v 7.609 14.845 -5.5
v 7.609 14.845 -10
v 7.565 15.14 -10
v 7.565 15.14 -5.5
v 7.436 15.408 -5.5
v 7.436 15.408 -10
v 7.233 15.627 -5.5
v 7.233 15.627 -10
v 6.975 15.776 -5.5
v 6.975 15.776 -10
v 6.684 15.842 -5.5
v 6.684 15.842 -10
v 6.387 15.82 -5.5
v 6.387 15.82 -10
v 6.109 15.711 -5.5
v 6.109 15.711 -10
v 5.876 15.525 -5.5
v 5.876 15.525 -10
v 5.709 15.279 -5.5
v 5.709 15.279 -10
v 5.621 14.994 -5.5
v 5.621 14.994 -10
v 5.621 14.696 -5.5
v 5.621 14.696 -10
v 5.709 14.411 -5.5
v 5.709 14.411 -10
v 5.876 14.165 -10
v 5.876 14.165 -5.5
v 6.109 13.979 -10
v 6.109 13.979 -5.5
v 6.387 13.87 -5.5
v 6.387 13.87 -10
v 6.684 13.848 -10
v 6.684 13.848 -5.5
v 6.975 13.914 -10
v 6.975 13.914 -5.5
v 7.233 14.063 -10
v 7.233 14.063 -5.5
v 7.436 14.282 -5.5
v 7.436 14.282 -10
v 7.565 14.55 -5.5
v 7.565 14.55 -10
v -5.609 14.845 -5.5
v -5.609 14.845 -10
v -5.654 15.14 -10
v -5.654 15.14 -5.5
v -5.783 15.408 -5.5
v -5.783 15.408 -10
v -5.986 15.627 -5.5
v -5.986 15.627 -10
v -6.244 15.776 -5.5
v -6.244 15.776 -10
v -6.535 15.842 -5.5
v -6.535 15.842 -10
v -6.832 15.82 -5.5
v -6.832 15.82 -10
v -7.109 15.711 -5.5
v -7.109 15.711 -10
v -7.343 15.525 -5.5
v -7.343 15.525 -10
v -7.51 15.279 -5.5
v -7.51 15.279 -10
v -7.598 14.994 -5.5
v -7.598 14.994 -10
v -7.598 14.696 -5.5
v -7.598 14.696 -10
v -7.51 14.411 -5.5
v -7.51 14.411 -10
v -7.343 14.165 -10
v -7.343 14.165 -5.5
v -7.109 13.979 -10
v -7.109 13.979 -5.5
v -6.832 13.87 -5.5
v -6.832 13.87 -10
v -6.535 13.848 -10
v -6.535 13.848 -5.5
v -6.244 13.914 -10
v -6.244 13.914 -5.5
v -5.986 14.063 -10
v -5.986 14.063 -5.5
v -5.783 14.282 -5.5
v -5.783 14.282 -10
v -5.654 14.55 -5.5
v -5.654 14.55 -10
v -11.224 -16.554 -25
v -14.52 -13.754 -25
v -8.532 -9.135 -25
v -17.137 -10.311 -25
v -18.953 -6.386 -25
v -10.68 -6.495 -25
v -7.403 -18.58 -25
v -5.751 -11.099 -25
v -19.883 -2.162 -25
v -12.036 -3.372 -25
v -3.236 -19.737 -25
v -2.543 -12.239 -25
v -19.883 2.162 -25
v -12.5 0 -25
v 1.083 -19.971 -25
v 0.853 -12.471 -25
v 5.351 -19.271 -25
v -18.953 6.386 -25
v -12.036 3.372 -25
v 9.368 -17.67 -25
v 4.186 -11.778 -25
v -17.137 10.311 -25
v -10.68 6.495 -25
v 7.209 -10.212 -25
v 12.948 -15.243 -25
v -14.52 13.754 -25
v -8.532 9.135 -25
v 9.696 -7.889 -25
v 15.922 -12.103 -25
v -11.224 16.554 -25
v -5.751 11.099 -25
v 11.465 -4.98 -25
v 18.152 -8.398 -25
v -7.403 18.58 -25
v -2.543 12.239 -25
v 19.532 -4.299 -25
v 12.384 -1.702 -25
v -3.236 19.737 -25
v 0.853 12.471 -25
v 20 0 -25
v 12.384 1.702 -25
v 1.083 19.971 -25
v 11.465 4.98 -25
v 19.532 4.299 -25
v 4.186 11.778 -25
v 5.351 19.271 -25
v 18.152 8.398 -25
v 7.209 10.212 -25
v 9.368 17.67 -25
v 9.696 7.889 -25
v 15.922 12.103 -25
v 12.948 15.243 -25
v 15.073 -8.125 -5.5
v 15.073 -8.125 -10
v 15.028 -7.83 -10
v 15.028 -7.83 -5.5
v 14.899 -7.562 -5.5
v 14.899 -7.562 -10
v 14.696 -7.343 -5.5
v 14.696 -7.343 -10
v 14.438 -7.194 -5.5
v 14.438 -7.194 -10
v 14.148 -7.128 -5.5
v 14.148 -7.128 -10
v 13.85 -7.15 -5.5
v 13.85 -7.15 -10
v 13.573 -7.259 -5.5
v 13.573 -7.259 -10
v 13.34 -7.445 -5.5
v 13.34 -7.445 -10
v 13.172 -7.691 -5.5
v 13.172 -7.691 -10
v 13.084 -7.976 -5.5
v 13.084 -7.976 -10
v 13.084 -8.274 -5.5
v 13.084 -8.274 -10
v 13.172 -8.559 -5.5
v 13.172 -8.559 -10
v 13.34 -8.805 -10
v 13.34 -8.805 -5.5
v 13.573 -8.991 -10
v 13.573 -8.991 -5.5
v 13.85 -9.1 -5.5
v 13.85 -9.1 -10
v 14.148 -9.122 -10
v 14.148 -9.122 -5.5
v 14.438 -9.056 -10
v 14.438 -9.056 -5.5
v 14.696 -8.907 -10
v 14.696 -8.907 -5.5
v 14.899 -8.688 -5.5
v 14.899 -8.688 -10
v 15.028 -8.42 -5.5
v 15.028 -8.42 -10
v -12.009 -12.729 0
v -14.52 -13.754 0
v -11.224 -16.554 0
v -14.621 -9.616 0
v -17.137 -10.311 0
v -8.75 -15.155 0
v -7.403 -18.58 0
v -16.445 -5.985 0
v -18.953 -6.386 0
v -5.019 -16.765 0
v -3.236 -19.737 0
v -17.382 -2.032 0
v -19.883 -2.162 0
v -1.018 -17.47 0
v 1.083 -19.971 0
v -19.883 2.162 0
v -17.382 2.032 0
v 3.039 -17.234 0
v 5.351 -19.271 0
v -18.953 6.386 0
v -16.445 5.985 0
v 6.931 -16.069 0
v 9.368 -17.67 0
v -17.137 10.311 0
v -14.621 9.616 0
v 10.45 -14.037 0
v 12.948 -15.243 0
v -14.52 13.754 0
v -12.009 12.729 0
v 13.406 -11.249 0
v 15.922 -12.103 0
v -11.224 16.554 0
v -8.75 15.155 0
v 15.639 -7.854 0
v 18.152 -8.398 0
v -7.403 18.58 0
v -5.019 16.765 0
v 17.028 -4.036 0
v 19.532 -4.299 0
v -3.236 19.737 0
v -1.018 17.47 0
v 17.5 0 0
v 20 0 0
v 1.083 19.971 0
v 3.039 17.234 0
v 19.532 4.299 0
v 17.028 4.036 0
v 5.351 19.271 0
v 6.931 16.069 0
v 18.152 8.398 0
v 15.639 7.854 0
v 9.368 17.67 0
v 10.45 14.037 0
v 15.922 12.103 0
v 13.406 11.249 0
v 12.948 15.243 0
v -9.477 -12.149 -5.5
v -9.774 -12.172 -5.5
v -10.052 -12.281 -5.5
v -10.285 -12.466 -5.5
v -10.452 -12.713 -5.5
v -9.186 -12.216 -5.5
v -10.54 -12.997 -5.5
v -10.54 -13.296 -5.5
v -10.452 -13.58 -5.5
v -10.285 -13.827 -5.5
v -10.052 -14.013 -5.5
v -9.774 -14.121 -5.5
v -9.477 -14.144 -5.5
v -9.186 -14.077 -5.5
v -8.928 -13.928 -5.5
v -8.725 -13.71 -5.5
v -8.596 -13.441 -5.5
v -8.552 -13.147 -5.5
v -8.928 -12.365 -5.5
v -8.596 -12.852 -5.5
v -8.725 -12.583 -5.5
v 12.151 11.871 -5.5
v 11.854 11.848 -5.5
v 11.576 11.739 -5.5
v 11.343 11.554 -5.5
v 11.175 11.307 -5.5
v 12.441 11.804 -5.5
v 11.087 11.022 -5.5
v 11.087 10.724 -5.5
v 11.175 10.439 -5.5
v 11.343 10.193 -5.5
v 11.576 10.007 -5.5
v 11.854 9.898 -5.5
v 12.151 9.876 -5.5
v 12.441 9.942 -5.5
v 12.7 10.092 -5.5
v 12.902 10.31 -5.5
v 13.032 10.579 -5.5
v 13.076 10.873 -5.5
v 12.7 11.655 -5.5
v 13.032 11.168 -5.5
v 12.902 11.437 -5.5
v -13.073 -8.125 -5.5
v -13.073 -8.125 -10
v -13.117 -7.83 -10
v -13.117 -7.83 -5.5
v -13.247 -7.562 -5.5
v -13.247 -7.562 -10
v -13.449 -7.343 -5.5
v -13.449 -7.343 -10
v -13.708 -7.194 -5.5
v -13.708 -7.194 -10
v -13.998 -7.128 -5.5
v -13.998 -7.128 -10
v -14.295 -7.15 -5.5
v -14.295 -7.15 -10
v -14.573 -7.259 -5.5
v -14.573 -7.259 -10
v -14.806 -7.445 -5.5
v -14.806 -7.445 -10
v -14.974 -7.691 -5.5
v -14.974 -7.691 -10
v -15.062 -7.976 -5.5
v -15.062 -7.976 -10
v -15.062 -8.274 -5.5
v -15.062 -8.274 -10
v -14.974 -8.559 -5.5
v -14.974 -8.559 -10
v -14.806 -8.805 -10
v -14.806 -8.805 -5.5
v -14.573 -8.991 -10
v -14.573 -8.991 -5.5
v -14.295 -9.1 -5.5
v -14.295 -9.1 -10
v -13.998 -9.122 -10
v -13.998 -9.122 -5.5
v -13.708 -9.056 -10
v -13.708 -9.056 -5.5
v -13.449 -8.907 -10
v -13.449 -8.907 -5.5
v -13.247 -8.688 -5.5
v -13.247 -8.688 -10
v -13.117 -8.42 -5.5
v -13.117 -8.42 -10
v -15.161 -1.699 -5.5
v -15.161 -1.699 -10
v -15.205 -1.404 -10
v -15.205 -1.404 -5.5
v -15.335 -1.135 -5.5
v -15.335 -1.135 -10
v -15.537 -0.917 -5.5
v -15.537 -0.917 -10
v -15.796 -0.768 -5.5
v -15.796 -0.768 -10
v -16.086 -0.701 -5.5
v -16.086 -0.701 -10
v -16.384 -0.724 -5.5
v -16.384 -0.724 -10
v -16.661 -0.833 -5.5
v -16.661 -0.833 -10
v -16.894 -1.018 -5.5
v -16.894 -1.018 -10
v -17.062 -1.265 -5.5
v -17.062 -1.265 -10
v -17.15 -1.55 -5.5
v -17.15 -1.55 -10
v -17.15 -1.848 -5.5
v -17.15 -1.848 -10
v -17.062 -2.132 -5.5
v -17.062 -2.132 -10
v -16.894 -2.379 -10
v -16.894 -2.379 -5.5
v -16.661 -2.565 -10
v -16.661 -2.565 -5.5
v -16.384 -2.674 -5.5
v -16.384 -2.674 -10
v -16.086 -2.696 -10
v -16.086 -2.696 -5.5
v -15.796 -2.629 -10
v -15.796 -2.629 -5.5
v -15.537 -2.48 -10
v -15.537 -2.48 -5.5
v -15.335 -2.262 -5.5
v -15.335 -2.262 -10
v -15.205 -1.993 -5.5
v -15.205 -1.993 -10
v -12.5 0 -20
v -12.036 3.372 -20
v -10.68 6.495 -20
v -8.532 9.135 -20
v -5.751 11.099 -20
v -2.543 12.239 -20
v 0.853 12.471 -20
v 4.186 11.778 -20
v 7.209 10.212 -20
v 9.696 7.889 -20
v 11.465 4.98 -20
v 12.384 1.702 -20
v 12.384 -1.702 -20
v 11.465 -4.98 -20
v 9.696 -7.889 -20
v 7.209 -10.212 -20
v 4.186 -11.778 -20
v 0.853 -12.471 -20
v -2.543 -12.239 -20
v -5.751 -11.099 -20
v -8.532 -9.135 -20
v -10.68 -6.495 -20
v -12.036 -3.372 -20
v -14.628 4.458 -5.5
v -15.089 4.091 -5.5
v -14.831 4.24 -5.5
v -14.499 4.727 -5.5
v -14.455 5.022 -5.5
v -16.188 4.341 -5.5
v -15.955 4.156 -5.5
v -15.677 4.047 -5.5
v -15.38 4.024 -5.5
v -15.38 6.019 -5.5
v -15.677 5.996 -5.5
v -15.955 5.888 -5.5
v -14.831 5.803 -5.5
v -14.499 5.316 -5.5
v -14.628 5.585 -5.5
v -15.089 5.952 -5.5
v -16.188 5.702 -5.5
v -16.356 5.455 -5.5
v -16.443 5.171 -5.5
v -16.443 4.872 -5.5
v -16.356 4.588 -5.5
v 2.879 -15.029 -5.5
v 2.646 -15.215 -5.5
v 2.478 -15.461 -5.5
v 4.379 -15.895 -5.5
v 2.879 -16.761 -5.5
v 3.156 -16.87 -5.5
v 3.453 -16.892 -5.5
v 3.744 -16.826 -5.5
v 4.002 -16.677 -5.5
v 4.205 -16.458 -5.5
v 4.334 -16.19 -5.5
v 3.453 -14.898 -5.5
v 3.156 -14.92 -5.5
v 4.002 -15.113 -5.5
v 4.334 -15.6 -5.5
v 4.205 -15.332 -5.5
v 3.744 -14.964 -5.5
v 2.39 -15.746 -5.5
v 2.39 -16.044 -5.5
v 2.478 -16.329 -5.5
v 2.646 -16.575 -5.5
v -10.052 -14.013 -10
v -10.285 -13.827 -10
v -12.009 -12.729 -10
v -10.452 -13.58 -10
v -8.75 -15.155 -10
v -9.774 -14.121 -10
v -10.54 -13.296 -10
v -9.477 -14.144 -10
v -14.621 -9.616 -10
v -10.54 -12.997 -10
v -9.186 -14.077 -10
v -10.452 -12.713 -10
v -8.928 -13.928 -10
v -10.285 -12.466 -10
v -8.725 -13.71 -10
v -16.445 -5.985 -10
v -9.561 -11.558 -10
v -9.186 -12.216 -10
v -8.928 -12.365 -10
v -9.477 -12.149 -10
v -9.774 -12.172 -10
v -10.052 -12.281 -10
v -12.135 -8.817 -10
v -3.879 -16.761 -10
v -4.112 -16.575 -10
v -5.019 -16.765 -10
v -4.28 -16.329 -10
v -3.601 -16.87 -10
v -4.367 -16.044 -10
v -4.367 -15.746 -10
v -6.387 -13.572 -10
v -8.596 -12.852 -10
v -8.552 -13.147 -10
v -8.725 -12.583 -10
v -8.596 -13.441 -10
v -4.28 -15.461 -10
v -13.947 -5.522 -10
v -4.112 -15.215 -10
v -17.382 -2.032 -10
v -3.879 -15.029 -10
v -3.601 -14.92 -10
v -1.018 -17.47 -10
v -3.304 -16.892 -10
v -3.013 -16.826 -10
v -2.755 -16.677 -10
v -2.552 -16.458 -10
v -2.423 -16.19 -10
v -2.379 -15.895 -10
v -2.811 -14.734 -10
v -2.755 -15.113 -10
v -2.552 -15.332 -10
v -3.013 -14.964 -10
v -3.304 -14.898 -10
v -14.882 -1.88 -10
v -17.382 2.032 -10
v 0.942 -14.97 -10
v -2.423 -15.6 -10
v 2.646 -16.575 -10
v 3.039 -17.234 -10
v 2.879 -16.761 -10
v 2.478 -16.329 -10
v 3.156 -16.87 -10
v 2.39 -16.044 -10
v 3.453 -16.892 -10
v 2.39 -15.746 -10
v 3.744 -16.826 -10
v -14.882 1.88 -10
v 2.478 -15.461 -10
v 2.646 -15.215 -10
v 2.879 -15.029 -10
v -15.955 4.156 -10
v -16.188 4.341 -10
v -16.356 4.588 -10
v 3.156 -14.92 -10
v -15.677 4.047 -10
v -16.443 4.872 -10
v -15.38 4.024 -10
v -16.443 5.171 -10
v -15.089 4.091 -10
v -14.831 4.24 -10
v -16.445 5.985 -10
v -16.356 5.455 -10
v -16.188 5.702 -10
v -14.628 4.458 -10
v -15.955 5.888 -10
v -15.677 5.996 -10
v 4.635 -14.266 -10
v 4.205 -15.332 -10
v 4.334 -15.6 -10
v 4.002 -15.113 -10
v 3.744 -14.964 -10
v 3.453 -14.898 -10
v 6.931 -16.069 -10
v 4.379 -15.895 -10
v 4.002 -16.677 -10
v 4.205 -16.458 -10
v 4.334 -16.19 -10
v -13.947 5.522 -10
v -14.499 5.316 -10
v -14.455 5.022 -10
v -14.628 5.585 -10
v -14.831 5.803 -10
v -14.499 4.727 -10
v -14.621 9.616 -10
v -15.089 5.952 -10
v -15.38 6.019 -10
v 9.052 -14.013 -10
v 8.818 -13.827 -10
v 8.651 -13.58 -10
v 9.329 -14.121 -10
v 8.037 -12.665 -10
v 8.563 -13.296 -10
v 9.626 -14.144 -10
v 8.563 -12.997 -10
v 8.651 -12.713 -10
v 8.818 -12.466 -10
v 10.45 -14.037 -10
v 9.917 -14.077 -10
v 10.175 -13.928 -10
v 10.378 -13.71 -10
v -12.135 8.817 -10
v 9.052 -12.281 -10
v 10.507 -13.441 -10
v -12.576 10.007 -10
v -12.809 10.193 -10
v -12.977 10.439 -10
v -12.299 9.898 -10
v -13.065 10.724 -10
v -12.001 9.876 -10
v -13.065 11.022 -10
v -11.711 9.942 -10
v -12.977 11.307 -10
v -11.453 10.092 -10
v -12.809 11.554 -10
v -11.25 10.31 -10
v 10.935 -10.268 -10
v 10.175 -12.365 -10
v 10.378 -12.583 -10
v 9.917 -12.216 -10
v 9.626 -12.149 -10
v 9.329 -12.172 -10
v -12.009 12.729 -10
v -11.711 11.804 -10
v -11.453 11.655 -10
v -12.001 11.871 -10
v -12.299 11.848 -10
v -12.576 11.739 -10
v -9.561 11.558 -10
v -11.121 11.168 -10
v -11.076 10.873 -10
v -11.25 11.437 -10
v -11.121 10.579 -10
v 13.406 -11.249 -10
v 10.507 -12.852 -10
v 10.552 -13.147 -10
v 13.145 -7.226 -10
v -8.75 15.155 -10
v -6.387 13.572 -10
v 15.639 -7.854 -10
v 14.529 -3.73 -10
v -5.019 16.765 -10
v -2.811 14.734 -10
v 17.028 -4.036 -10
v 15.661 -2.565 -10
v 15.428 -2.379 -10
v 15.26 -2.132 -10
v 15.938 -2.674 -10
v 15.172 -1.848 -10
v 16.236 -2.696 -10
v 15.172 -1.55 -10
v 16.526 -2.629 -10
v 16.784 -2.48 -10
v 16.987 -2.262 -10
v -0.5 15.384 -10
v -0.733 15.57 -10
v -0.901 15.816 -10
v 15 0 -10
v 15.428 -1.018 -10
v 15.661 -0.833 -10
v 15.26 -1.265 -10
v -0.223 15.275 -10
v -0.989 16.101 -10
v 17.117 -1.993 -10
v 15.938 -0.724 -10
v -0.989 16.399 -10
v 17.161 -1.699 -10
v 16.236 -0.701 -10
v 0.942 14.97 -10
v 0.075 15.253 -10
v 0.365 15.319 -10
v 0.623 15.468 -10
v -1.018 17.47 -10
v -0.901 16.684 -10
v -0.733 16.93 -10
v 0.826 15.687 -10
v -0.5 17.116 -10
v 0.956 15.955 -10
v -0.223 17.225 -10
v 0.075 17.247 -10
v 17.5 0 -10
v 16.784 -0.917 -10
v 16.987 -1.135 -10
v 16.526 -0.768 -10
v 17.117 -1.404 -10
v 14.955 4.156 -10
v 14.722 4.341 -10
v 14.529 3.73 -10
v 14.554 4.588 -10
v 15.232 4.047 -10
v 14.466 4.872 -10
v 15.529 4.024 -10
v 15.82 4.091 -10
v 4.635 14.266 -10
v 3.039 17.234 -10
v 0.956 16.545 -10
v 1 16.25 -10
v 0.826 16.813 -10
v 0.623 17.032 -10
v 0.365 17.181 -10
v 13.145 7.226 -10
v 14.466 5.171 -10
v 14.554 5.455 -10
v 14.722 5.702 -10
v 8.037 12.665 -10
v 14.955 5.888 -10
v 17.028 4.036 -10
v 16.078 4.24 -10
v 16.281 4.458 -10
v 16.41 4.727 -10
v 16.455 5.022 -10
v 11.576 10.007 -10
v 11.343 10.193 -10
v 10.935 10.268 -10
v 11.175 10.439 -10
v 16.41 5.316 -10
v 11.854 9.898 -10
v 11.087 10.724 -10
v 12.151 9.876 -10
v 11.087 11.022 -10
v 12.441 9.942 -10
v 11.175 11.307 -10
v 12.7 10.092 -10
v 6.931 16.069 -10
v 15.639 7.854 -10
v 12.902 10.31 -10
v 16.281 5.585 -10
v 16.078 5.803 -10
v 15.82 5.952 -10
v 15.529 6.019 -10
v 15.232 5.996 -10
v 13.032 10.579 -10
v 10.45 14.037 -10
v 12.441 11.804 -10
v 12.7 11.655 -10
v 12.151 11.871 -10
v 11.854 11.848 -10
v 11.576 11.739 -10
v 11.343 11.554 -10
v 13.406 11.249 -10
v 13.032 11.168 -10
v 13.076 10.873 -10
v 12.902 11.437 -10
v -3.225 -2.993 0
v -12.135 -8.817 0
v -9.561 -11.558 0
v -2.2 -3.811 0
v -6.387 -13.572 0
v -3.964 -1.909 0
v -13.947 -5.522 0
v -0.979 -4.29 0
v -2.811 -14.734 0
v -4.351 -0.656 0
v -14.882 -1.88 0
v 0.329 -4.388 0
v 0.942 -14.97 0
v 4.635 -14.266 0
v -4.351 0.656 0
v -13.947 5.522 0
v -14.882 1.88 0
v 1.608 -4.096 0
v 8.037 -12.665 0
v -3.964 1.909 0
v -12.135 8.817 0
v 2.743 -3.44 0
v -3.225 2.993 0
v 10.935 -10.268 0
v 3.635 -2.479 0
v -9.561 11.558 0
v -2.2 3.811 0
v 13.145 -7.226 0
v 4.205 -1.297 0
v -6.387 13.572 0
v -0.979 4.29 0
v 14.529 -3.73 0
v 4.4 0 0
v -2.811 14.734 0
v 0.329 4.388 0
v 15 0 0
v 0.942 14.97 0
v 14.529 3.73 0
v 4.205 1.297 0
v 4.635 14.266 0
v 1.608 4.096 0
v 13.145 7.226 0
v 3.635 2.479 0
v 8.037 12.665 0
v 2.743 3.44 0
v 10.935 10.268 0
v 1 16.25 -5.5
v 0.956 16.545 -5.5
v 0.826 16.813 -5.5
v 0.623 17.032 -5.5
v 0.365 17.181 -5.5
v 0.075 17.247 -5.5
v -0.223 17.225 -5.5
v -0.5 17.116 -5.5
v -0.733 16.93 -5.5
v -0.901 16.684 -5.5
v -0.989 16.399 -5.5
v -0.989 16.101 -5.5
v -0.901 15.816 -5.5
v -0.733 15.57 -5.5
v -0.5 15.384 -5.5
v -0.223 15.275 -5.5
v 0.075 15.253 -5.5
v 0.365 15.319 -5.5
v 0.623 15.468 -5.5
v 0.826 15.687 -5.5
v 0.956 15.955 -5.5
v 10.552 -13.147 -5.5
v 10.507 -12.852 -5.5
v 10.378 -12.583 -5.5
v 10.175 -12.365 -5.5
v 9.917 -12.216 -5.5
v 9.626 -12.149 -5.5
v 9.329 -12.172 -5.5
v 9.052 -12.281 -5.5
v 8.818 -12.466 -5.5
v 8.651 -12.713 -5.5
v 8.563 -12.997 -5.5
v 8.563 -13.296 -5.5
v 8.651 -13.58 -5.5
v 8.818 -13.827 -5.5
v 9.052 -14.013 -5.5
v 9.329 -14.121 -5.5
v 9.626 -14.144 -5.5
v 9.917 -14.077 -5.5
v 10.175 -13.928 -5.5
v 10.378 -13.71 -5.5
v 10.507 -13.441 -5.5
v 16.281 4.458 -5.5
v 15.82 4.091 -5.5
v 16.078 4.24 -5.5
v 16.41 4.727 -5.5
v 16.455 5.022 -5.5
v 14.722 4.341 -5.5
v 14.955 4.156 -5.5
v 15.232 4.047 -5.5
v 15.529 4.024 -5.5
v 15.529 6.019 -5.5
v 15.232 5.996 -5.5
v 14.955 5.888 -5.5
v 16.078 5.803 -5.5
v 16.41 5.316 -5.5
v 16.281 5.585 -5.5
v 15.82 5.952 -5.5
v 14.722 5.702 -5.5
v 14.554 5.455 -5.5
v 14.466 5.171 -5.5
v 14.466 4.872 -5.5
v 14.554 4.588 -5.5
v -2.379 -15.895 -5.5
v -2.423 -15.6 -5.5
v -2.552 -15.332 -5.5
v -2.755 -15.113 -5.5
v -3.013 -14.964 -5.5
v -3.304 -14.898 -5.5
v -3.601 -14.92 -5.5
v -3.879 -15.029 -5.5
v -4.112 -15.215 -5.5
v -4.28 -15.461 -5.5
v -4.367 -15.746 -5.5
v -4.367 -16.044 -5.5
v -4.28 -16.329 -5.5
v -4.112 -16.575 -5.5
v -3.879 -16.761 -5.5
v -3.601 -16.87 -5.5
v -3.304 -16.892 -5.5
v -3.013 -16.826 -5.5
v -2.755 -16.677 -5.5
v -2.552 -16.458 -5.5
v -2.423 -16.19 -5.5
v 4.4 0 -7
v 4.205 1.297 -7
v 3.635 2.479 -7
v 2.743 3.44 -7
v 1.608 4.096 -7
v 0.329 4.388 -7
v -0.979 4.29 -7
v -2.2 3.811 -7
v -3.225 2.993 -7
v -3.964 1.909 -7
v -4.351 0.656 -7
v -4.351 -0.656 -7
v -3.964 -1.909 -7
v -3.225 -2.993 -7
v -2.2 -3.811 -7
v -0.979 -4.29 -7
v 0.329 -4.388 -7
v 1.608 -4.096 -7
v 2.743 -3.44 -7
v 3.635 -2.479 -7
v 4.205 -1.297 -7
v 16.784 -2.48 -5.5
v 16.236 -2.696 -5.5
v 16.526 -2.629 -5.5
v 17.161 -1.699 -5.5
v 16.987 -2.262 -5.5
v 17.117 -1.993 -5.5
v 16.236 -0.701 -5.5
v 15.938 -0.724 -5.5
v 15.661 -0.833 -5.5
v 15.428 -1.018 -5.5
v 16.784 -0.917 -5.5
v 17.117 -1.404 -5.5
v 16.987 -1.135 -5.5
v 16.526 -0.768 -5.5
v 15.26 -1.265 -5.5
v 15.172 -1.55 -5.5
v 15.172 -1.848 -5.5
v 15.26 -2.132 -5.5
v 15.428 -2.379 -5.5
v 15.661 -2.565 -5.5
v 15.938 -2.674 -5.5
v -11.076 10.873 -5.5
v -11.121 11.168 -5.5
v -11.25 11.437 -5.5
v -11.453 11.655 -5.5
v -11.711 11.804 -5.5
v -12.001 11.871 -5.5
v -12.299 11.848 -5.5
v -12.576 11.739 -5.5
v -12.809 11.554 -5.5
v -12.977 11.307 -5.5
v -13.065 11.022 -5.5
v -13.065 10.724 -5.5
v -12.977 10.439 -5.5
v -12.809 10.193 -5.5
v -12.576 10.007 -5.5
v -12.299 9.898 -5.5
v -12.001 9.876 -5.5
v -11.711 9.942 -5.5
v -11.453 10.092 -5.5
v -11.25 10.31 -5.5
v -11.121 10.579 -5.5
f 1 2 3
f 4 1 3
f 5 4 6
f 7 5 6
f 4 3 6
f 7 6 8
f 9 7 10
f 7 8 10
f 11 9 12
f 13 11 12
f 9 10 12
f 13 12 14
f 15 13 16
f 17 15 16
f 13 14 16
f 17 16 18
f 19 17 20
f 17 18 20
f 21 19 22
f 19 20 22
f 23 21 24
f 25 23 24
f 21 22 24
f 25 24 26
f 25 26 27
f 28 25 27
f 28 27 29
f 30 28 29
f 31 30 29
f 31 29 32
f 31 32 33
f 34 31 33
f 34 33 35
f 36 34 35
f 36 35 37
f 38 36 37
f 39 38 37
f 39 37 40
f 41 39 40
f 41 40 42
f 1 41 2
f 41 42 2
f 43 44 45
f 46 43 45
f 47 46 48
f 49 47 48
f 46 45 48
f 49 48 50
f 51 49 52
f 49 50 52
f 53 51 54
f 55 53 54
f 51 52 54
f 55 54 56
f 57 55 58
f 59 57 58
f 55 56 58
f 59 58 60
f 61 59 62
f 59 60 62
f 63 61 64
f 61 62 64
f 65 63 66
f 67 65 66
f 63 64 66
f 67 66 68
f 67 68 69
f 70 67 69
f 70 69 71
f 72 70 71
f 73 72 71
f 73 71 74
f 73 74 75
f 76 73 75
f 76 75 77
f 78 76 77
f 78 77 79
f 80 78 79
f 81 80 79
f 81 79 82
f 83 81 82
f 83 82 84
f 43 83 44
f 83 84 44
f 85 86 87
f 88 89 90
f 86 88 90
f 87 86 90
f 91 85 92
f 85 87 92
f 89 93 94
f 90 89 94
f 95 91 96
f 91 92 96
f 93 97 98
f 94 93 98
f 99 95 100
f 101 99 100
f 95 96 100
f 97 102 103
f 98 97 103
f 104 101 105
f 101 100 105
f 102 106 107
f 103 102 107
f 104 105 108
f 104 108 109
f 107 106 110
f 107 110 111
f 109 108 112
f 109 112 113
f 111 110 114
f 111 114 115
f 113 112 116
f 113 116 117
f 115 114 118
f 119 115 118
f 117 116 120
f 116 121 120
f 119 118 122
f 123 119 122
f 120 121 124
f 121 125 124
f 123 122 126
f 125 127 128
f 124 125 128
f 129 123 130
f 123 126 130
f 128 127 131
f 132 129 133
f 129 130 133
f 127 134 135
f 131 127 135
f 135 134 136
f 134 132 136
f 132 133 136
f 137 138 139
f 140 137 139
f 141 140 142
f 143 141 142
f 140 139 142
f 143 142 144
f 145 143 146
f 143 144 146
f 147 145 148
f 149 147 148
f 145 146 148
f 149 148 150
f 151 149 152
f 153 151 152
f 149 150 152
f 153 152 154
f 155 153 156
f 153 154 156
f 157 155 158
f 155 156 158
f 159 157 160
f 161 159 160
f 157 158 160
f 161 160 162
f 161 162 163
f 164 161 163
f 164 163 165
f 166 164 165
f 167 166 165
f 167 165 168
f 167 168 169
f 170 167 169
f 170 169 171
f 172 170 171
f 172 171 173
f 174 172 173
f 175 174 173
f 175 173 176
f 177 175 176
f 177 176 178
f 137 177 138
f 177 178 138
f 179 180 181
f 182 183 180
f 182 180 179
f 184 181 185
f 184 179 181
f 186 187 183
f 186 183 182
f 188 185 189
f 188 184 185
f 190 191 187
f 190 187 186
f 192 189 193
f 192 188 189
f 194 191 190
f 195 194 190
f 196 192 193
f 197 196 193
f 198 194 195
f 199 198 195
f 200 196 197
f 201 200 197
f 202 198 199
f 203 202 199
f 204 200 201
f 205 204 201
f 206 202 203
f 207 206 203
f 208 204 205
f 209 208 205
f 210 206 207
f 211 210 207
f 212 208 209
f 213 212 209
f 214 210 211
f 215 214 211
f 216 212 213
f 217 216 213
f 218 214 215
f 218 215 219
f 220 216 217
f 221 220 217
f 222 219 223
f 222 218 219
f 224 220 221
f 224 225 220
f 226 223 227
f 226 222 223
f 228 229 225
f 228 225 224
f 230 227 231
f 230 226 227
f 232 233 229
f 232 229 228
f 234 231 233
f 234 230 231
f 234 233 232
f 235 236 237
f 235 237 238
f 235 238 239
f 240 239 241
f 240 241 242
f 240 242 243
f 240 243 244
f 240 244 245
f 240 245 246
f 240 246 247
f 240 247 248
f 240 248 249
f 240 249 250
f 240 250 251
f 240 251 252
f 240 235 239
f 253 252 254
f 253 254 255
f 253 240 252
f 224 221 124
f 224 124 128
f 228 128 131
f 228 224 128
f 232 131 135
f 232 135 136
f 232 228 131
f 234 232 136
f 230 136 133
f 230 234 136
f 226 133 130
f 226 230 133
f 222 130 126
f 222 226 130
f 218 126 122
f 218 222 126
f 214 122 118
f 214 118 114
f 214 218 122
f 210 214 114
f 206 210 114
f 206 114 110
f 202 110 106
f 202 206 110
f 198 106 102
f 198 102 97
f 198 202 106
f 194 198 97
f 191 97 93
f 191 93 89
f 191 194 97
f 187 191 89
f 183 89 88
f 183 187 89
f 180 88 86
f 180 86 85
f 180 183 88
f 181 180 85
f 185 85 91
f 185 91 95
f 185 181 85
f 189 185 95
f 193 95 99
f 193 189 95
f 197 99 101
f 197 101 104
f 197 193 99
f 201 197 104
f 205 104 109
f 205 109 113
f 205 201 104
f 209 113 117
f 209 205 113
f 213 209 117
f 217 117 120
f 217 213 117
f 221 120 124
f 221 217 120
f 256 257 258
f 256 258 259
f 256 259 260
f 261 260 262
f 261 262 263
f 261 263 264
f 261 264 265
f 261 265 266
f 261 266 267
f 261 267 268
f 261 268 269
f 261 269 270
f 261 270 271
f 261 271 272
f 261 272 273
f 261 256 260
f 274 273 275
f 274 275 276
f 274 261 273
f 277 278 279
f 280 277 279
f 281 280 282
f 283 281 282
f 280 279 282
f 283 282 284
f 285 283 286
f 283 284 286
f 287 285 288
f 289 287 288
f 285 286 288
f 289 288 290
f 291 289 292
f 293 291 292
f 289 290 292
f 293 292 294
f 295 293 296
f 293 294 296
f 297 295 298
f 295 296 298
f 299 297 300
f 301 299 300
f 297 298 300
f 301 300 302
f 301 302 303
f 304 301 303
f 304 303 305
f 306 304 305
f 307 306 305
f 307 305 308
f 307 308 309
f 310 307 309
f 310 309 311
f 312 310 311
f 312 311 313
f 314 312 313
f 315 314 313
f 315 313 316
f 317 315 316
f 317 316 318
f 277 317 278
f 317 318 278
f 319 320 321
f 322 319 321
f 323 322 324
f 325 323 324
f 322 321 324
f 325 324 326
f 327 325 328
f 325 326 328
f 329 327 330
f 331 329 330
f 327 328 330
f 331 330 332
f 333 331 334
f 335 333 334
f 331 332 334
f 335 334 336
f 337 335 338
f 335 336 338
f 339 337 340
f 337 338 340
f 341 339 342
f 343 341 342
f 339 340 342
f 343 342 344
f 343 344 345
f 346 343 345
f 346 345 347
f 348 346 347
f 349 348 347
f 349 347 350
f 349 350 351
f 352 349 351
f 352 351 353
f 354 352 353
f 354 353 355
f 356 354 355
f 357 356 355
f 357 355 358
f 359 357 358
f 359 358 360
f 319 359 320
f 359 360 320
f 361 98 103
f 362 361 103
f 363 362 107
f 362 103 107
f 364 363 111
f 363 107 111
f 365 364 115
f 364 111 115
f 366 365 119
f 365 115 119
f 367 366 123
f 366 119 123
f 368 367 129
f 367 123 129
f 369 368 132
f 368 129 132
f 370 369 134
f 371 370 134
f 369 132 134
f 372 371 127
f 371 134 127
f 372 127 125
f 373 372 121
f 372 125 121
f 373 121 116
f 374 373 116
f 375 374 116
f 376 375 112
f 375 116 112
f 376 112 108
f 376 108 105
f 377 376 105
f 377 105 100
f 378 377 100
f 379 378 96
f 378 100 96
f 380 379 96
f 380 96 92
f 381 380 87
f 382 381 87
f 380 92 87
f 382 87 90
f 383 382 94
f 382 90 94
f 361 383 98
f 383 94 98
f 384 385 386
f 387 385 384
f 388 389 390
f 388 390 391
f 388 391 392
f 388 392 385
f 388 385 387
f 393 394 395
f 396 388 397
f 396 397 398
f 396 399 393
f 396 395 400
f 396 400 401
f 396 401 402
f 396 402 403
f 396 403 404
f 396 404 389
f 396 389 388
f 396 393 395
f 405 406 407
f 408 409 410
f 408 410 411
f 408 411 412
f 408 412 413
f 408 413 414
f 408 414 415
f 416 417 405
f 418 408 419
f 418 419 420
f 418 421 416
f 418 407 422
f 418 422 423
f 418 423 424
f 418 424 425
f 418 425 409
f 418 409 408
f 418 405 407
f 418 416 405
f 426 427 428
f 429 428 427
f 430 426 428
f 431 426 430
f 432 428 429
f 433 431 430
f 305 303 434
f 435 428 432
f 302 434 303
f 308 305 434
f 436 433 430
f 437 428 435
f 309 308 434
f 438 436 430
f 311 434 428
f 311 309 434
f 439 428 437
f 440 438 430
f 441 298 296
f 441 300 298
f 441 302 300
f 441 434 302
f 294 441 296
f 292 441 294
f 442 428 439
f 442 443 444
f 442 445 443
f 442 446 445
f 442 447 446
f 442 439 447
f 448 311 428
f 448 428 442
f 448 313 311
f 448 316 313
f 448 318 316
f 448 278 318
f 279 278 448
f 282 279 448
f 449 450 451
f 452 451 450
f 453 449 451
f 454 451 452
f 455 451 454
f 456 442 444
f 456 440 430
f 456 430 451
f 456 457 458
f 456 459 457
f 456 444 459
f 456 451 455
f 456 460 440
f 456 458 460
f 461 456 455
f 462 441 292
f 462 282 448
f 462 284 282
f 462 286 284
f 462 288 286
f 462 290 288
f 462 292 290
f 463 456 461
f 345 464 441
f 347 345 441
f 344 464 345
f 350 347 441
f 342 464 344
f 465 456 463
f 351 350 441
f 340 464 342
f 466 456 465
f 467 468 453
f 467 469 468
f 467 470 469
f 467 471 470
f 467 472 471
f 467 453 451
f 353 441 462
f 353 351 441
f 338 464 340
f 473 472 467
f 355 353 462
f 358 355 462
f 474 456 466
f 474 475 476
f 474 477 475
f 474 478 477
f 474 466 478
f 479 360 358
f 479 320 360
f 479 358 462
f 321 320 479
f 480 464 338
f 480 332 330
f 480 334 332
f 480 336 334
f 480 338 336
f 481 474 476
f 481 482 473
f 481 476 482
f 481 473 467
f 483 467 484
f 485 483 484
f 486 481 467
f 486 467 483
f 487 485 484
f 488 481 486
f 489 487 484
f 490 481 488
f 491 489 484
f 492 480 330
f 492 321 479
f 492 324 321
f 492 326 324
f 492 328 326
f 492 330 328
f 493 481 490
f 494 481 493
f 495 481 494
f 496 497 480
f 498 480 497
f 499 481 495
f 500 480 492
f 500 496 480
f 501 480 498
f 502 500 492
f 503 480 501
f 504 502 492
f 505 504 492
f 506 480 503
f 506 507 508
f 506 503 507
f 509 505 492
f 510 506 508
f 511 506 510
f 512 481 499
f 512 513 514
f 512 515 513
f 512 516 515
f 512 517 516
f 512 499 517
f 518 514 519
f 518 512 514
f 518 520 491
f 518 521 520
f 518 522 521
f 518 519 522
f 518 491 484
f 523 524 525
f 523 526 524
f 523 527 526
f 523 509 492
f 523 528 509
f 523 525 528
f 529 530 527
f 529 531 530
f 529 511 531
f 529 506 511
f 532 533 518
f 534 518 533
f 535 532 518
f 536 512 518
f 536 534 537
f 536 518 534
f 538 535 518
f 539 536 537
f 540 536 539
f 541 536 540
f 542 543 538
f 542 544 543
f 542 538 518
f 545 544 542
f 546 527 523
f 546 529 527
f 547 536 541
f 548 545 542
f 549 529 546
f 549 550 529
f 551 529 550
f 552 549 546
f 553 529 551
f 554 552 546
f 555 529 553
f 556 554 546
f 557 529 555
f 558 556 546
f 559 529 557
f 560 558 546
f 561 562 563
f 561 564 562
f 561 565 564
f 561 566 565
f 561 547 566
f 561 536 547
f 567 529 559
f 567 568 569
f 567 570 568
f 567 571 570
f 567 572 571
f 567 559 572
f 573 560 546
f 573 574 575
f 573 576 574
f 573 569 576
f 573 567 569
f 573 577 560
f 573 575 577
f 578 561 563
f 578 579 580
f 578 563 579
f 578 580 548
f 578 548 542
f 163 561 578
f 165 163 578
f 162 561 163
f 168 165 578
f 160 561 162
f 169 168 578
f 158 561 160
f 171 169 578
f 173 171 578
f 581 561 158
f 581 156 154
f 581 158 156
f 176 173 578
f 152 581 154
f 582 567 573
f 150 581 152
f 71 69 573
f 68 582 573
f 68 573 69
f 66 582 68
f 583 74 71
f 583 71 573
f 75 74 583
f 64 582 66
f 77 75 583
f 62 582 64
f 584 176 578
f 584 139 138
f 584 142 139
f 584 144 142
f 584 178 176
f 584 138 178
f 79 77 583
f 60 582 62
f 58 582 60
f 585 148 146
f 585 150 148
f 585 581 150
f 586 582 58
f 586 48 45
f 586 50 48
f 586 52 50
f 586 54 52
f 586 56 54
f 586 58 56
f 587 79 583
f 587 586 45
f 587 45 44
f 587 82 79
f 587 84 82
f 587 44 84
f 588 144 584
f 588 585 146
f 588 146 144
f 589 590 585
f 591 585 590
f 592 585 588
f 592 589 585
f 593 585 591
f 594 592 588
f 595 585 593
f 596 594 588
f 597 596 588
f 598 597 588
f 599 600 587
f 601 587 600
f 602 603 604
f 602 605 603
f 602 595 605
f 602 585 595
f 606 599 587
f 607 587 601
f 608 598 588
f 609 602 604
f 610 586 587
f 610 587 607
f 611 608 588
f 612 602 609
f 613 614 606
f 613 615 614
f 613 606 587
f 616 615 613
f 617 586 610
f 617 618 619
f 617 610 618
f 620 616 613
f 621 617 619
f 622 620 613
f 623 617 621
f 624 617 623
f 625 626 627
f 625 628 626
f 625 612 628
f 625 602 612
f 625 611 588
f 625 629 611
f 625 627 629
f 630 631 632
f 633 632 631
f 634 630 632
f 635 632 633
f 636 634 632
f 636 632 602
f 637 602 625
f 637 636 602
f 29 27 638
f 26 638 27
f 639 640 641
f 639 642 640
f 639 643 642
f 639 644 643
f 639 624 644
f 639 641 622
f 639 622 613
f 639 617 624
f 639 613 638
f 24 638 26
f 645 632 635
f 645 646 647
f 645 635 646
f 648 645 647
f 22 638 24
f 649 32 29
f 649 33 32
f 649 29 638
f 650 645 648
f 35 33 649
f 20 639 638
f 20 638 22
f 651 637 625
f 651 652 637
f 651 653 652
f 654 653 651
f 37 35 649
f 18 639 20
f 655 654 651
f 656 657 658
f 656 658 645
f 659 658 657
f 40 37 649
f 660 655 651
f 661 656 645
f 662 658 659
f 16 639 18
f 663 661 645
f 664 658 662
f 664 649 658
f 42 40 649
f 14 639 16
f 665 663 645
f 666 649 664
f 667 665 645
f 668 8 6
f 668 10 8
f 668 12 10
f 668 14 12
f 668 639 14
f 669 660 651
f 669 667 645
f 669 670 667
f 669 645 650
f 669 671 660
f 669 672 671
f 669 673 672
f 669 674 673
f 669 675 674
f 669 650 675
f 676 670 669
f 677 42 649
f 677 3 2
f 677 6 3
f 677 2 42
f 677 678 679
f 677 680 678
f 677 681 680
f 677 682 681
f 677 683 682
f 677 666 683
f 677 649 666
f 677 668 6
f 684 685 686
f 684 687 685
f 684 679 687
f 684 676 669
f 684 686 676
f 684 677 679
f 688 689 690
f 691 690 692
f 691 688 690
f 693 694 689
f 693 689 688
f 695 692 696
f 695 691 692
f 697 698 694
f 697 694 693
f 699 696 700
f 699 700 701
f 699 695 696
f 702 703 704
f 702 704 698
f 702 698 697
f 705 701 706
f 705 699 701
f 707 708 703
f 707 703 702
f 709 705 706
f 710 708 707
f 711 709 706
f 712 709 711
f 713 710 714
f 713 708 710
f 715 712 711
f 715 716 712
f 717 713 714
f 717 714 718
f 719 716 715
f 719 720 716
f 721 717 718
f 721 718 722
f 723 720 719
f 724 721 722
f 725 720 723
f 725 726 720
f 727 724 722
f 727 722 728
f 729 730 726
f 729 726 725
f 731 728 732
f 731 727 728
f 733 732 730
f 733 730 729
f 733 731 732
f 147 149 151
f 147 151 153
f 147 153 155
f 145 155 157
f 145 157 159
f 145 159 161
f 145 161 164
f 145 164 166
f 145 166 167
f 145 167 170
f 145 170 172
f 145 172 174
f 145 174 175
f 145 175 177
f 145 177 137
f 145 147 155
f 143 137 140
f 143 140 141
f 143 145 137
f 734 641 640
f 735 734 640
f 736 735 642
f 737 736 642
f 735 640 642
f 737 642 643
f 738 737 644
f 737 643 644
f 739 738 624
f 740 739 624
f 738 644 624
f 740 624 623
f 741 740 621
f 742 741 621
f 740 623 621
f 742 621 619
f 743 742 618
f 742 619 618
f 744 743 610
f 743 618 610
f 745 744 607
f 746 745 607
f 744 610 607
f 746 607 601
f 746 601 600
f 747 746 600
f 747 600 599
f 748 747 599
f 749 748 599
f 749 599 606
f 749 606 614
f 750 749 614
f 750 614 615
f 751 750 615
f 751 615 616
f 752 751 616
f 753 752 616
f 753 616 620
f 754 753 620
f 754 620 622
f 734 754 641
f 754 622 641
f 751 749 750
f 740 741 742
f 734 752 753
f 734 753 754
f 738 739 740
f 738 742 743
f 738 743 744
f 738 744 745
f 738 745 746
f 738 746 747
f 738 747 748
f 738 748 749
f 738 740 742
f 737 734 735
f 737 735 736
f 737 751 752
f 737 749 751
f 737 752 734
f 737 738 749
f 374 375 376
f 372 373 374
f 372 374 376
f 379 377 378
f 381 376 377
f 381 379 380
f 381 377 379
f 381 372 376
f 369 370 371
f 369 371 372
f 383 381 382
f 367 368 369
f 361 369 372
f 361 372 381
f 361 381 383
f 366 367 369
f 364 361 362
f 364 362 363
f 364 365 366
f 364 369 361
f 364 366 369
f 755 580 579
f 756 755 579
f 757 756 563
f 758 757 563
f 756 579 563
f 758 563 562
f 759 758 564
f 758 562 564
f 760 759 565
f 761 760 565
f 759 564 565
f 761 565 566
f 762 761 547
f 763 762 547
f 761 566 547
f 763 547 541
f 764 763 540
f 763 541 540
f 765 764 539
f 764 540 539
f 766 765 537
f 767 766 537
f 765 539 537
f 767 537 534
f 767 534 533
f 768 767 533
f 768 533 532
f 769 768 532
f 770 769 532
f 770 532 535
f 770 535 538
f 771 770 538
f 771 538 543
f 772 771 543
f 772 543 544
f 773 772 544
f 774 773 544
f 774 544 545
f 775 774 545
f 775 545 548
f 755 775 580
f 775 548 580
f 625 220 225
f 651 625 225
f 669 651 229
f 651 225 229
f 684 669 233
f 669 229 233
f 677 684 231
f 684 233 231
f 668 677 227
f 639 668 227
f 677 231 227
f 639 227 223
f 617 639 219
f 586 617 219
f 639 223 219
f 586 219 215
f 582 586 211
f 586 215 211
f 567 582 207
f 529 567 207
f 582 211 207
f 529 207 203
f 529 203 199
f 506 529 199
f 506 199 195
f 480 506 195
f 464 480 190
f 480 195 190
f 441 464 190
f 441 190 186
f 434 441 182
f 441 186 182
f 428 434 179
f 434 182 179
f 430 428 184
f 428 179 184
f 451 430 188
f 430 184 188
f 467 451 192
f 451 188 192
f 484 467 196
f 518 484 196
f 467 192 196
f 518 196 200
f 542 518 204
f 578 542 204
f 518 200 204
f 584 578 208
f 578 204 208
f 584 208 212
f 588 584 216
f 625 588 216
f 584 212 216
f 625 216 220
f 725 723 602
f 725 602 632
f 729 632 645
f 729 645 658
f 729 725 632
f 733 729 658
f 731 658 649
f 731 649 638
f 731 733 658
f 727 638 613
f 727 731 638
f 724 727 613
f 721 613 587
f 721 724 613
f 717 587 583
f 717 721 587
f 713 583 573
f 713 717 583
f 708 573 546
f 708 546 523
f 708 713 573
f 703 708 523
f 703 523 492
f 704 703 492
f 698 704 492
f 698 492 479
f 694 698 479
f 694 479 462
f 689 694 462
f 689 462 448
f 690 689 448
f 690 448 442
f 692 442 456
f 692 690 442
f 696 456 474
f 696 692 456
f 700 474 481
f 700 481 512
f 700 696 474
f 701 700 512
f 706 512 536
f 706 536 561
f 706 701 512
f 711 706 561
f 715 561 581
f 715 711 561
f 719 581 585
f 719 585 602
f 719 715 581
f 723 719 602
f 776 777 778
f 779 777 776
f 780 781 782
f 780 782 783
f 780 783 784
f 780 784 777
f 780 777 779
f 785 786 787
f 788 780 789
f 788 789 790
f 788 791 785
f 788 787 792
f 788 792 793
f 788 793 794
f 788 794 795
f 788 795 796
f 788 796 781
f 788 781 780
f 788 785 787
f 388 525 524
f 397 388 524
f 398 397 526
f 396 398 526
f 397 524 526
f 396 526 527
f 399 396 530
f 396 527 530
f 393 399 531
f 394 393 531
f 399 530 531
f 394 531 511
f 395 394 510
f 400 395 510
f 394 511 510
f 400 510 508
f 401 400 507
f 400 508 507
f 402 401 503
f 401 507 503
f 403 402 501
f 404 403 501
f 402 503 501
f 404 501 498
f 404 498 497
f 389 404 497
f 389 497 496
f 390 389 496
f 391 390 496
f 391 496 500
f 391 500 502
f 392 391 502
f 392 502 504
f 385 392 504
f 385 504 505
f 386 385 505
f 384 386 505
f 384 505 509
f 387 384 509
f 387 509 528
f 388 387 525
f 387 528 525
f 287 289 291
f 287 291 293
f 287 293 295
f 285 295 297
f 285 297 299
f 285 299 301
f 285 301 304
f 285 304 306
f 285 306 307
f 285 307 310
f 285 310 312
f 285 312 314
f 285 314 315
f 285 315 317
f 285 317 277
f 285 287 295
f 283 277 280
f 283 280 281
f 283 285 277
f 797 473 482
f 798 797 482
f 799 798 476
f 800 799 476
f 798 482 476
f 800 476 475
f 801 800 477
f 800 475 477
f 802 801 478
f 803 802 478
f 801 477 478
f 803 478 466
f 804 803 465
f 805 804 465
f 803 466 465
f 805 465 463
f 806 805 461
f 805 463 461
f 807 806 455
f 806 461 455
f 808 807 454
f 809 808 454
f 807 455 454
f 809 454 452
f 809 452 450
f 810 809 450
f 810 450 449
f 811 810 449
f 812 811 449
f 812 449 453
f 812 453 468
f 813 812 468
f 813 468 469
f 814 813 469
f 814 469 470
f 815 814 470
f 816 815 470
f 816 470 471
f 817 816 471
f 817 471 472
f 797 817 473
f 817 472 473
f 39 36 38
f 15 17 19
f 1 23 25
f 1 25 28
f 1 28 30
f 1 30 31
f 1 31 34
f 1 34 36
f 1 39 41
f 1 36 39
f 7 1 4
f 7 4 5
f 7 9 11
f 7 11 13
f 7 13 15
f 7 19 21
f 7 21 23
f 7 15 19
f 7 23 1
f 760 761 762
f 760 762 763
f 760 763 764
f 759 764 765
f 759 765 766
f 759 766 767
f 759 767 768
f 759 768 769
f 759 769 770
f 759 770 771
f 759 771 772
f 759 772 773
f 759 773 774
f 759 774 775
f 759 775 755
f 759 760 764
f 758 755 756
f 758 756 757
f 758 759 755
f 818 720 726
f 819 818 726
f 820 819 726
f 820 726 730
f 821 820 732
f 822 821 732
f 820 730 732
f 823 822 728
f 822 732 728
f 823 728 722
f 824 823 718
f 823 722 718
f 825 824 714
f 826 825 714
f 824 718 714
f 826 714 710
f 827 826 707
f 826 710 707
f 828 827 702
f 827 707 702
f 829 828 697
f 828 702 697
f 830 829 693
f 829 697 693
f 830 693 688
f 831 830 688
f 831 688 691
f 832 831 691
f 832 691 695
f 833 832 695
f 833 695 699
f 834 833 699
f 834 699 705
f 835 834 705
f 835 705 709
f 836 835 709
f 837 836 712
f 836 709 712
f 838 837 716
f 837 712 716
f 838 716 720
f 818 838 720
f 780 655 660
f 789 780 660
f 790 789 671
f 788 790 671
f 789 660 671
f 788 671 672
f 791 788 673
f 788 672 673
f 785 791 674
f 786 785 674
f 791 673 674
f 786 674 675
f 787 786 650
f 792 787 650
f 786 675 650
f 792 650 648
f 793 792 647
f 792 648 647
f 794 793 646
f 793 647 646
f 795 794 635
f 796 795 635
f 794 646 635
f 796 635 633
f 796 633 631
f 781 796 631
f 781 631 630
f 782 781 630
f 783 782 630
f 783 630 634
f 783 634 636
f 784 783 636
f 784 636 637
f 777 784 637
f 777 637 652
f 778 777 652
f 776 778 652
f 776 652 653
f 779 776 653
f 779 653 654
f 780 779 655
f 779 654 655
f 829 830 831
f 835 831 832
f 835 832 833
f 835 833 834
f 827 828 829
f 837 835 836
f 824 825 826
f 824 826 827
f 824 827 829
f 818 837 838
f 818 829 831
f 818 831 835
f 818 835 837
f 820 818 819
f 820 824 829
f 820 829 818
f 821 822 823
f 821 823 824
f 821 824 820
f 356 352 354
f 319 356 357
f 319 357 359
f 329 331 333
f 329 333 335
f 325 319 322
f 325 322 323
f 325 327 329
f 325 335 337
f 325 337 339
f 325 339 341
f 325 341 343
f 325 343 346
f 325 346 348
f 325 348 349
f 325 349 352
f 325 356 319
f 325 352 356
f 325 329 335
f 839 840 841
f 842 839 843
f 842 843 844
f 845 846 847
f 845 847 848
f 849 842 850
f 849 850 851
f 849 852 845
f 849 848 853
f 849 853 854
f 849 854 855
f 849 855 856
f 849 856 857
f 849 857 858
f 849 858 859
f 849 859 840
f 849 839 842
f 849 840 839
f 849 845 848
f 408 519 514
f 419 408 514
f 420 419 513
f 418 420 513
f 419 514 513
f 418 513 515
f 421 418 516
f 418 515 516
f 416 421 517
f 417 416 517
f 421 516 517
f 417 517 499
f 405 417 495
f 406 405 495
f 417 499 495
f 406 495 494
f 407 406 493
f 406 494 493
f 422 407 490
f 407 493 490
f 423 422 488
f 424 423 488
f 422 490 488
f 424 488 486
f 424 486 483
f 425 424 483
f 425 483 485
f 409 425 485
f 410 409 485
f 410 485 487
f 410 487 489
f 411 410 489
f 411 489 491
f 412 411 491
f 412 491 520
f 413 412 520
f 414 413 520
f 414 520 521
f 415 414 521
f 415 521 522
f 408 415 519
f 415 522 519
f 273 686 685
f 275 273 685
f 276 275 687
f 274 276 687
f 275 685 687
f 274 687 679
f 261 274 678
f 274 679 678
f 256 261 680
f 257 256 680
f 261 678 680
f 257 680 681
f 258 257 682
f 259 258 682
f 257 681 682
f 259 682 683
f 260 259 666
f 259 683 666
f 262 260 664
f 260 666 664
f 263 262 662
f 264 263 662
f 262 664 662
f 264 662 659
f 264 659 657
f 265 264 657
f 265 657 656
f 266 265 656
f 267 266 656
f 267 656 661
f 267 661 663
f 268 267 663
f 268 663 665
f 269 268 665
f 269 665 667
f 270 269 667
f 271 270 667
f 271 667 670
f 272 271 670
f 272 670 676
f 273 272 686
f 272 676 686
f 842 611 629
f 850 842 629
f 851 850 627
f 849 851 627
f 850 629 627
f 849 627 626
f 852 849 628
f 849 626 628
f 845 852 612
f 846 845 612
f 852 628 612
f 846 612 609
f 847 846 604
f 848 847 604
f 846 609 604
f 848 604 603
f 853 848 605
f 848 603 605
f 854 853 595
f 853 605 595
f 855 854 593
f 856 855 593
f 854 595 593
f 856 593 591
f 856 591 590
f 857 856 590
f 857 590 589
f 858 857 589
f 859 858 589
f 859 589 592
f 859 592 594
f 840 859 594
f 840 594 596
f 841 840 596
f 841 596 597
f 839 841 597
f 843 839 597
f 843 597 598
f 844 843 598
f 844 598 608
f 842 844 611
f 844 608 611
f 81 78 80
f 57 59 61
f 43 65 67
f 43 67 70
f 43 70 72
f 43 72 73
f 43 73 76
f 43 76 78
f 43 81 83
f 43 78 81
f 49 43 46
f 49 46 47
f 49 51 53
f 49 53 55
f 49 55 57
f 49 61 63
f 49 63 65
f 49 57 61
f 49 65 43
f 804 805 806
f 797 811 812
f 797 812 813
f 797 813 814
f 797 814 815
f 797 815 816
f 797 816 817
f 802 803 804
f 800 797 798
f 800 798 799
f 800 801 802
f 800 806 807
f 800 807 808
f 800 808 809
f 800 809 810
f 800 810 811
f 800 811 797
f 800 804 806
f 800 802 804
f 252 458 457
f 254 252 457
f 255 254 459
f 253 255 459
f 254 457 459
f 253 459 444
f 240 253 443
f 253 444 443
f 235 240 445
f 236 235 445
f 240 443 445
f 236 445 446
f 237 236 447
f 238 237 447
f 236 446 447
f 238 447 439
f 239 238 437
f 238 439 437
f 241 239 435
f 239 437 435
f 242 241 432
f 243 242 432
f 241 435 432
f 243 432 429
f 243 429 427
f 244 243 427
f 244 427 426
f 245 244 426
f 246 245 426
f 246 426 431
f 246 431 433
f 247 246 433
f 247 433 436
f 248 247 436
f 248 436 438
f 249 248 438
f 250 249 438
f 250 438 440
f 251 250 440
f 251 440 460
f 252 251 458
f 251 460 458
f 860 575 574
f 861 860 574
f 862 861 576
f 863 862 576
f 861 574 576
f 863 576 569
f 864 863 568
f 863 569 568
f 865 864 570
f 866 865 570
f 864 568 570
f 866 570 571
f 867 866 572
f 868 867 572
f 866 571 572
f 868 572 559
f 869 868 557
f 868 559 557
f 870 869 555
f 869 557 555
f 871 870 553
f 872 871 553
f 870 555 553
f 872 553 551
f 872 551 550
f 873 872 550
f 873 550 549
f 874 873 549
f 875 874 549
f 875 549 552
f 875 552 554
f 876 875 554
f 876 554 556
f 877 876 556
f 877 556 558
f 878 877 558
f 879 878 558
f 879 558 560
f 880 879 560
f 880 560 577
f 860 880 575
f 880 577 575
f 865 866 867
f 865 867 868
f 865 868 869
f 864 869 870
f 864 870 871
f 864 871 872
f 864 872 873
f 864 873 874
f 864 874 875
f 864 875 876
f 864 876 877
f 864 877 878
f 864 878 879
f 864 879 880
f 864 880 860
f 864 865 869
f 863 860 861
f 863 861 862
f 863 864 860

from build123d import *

# Parameters (mm, degrees)
SKETCH1_R           = 20
BOSS_EXTRUDE1_DEPTH = 25
SKETCH2_R           = 17.5
SKETCH2_R_2         = 15
CUT_EXTRUDE1_DEPTH  = 10
SKETCH3_R           = 4.4
CUT_EXTRUDE2_DEPTH  = 7
SKETCH4_R           = 12.5
CUT_EXTRUDE3_DEPTH  = 5
SKETCH5_R           = 1
BOSS_EXTRUDE2_DEPTH = 4.5


with BuildPart() as part:
    # Sketch1 → Boss-Extrude1 (new body)
    with BuildSketch(Plane.XY):
        Circle(SKETCH1_R)
    extrude(amount=-BOSS_EXTRUDE1_DEPTH)

    # Sketch2 → Cut-Extrude1 (cut)
    with BuildSketch(Plane.XY):
        Circle(SKETCH2_R)
        Circle(SKETCH2_R_2, mode=Mode.SUBTRACT)
    extrude(amount=-CUT_EXTRUDE1_DEPTH, mode=Mode.SUBTRACT)

    # Sketch3 → Cut-Extrude2 (cut)
    with BuildSketch(Plane.XY):
        Circle(SKETCH3_R)
    extrude(amount=-CUT_EXTRUDE2_DEPTH, mode=Mode.SUBTRACT)

    # Sketch4 → Cut-Extrude3 (cut)
    with BuildSketch(Plane(origin=(0, 0, -25), x_dir=(-1, 0, 0), z_dir=(0, 0, -1))):
        Circle(SKETCH4_R)
    extrude(amount=-CUT_EXTRUDE3_DEPTH, mode=Mode.SUBTRACT)

    # Sketch5 → Boss-Extrude2 (add)
    with BuildSketch(Plane.XY.offset(-10)):
        with Locations((0, 16.25)):
            Circle(SKETCH5_R)
        with Locations((6.60947045, 14.845113687)):
            Circle(SKETCH5_R)
        with Locations((12.076103414, 10.873372353)):
            Circle(SKETCH5_R)
        with Locations((15.45466839, 5.021526159)):
            Circle(SKETCH5_R)
        with Locations((16.1609808, -1.698587528)):
            Circle(SKETCH5_R)
        with Locations((14.072912811, -8.125)):
            Circle(SKETCH5_R)
        with Locations((9.55151035, -13.146526159)):
            Circle(SKETCH5_R)
        with Locations((3.378564976, -15.894898512)):
            Circle(SKETCH5_R)
        with Locations((-3.378564976, -15.894898512)):
            Circle(SKETCH5_R)
        with Locations((-9.55151035, -13.146526159)):
            Circle(SKETCH5_R)
        with Locations((-14.072912811, -8.125)):
            Circle(SKETCH5_R)
        with Locations((-16.1609808, -1.698587528)):
            Circle(SKETCH5_R)
        with Locations((-15.45466839, 5.021526159)):
            Circle(SKETCH5_R)
        with Locations((-12.076103414, 10.873372353)):
            Circle(SKETCH5_R)
        with Locations((-6.60947045, 14.845113687)):
            Circle(SKETCH5_R)
    extrude(amount=BOSS_EXTRUDE2_DEPTH)


solid = part.part
